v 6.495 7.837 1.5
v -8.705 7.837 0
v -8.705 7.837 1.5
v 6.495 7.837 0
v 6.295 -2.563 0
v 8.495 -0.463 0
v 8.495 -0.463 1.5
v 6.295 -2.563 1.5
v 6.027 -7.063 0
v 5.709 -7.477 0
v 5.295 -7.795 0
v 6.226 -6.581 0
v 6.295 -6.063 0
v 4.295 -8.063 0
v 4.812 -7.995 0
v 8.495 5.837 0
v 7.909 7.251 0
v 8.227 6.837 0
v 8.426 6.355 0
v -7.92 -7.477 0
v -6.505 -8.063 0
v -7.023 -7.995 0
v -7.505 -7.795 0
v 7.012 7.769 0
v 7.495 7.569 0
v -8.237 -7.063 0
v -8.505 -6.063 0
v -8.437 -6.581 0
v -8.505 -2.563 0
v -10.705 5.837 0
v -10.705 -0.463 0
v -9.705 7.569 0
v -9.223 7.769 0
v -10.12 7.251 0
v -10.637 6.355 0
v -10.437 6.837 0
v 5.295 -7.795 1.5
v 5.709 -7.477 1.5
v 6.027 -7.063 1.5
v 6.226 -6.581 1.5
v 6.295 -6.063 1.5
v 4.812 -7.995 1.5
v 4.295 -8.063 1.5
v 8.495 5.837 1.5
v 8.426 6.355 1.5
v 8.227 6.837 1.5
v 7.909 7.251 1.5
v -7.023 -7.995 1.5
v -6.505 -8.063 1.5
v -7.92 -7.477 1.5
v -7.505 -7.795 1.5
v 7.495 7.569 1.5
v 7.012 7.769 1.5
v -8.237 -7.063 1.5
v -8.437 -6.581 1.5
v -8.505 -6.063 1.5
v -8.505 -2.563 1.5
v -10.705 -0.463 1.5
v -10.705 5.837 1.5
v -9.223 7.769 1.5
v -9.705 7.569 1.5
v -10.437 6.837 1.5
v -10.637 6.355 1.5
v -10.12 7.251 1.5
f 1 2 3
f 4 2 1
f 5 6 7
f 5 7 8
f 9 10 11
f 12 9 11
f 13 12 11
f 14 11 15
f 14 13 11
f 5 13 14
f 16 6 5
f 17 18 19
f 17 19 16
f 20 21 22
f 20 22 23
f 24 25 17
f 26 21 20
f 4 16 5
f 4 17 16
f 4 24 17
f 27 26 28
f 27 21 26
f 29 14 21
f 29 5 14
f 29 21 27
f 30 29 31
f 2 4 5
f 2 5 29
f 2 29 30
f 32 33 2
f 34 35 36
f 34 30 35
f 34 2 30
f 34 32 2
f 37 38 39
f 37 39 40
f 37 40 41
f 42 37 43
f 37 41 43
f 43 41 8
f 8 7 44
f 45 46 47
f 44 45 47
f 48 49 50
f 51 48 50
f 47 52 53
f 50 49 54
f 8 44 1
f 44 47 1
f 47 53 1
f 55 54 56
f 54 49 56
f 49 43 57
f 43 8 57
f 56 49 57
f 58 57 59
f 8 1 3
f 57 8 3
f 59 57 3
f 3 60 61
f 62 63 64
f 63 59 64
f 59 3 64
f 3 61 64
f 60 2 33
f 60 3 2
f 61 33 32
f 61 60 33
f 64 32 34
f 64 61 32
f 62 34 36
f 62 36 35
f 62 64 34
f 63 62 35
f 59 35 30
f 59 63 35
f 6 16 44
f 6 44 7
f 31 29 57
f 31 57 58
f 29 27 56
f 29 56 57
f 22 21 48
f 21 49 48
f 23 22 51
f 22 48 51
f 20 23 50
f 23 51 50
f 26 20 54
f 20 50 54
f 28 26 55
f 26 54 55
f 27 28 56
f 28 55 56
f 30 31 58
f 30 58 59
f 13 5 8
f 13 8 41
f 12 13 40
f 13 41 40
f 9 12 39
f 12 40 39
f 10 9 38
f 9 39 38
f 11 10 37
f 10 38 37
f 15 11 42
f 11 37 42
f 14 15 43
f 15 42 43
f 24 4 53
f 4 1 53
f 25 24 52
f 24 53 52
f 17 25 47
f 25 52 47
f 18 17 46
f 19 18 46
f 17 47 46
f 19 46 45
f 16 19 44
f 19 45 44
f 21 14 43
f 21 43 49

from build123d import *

# Parameters (mm, degrees)
DODANIE_WYCI_GNI_CIE1_DEPTH = 1.5
ZAOKR_GLENIE1_R             = 2


with BuildPart() as part:
    # Szkic1 → Dodanie-wyciągnięcie1 (new body)
    with BuildSketch(Plane.XY):
        Polygon((-10.705397727, 7.837073864), (8.494602273, 7.837073864), (8.494602273, -0.462926136), (6.294602273, -2.562926136), (6.294602273, -8.062926136), (-8.505397727, -8.062926136), (-8.505397727, -2.562926136), (-10.705397727, -0.462926136), align=None)
    extrude(amount=DODANIE_WYCI_GNI_CIE1_DEPTH)

    # Zaokrąglenie1
    zaokr_glenie1_edges = [part.edges().sort_by_distance(p)[0] for p in [
        (-10.705397727, 7.837073864, 0.75),
        (8.494602273, 7.837073864, 0.75),
        (6.294602273, -8.062926136, 0.75),
        (-8.505397727, -8.062926136, 0.75),
    ]]
    fillet(zaokr_glenie1_edges, radius=ZAOKR_GLENIE1_R)


solid = part.part
